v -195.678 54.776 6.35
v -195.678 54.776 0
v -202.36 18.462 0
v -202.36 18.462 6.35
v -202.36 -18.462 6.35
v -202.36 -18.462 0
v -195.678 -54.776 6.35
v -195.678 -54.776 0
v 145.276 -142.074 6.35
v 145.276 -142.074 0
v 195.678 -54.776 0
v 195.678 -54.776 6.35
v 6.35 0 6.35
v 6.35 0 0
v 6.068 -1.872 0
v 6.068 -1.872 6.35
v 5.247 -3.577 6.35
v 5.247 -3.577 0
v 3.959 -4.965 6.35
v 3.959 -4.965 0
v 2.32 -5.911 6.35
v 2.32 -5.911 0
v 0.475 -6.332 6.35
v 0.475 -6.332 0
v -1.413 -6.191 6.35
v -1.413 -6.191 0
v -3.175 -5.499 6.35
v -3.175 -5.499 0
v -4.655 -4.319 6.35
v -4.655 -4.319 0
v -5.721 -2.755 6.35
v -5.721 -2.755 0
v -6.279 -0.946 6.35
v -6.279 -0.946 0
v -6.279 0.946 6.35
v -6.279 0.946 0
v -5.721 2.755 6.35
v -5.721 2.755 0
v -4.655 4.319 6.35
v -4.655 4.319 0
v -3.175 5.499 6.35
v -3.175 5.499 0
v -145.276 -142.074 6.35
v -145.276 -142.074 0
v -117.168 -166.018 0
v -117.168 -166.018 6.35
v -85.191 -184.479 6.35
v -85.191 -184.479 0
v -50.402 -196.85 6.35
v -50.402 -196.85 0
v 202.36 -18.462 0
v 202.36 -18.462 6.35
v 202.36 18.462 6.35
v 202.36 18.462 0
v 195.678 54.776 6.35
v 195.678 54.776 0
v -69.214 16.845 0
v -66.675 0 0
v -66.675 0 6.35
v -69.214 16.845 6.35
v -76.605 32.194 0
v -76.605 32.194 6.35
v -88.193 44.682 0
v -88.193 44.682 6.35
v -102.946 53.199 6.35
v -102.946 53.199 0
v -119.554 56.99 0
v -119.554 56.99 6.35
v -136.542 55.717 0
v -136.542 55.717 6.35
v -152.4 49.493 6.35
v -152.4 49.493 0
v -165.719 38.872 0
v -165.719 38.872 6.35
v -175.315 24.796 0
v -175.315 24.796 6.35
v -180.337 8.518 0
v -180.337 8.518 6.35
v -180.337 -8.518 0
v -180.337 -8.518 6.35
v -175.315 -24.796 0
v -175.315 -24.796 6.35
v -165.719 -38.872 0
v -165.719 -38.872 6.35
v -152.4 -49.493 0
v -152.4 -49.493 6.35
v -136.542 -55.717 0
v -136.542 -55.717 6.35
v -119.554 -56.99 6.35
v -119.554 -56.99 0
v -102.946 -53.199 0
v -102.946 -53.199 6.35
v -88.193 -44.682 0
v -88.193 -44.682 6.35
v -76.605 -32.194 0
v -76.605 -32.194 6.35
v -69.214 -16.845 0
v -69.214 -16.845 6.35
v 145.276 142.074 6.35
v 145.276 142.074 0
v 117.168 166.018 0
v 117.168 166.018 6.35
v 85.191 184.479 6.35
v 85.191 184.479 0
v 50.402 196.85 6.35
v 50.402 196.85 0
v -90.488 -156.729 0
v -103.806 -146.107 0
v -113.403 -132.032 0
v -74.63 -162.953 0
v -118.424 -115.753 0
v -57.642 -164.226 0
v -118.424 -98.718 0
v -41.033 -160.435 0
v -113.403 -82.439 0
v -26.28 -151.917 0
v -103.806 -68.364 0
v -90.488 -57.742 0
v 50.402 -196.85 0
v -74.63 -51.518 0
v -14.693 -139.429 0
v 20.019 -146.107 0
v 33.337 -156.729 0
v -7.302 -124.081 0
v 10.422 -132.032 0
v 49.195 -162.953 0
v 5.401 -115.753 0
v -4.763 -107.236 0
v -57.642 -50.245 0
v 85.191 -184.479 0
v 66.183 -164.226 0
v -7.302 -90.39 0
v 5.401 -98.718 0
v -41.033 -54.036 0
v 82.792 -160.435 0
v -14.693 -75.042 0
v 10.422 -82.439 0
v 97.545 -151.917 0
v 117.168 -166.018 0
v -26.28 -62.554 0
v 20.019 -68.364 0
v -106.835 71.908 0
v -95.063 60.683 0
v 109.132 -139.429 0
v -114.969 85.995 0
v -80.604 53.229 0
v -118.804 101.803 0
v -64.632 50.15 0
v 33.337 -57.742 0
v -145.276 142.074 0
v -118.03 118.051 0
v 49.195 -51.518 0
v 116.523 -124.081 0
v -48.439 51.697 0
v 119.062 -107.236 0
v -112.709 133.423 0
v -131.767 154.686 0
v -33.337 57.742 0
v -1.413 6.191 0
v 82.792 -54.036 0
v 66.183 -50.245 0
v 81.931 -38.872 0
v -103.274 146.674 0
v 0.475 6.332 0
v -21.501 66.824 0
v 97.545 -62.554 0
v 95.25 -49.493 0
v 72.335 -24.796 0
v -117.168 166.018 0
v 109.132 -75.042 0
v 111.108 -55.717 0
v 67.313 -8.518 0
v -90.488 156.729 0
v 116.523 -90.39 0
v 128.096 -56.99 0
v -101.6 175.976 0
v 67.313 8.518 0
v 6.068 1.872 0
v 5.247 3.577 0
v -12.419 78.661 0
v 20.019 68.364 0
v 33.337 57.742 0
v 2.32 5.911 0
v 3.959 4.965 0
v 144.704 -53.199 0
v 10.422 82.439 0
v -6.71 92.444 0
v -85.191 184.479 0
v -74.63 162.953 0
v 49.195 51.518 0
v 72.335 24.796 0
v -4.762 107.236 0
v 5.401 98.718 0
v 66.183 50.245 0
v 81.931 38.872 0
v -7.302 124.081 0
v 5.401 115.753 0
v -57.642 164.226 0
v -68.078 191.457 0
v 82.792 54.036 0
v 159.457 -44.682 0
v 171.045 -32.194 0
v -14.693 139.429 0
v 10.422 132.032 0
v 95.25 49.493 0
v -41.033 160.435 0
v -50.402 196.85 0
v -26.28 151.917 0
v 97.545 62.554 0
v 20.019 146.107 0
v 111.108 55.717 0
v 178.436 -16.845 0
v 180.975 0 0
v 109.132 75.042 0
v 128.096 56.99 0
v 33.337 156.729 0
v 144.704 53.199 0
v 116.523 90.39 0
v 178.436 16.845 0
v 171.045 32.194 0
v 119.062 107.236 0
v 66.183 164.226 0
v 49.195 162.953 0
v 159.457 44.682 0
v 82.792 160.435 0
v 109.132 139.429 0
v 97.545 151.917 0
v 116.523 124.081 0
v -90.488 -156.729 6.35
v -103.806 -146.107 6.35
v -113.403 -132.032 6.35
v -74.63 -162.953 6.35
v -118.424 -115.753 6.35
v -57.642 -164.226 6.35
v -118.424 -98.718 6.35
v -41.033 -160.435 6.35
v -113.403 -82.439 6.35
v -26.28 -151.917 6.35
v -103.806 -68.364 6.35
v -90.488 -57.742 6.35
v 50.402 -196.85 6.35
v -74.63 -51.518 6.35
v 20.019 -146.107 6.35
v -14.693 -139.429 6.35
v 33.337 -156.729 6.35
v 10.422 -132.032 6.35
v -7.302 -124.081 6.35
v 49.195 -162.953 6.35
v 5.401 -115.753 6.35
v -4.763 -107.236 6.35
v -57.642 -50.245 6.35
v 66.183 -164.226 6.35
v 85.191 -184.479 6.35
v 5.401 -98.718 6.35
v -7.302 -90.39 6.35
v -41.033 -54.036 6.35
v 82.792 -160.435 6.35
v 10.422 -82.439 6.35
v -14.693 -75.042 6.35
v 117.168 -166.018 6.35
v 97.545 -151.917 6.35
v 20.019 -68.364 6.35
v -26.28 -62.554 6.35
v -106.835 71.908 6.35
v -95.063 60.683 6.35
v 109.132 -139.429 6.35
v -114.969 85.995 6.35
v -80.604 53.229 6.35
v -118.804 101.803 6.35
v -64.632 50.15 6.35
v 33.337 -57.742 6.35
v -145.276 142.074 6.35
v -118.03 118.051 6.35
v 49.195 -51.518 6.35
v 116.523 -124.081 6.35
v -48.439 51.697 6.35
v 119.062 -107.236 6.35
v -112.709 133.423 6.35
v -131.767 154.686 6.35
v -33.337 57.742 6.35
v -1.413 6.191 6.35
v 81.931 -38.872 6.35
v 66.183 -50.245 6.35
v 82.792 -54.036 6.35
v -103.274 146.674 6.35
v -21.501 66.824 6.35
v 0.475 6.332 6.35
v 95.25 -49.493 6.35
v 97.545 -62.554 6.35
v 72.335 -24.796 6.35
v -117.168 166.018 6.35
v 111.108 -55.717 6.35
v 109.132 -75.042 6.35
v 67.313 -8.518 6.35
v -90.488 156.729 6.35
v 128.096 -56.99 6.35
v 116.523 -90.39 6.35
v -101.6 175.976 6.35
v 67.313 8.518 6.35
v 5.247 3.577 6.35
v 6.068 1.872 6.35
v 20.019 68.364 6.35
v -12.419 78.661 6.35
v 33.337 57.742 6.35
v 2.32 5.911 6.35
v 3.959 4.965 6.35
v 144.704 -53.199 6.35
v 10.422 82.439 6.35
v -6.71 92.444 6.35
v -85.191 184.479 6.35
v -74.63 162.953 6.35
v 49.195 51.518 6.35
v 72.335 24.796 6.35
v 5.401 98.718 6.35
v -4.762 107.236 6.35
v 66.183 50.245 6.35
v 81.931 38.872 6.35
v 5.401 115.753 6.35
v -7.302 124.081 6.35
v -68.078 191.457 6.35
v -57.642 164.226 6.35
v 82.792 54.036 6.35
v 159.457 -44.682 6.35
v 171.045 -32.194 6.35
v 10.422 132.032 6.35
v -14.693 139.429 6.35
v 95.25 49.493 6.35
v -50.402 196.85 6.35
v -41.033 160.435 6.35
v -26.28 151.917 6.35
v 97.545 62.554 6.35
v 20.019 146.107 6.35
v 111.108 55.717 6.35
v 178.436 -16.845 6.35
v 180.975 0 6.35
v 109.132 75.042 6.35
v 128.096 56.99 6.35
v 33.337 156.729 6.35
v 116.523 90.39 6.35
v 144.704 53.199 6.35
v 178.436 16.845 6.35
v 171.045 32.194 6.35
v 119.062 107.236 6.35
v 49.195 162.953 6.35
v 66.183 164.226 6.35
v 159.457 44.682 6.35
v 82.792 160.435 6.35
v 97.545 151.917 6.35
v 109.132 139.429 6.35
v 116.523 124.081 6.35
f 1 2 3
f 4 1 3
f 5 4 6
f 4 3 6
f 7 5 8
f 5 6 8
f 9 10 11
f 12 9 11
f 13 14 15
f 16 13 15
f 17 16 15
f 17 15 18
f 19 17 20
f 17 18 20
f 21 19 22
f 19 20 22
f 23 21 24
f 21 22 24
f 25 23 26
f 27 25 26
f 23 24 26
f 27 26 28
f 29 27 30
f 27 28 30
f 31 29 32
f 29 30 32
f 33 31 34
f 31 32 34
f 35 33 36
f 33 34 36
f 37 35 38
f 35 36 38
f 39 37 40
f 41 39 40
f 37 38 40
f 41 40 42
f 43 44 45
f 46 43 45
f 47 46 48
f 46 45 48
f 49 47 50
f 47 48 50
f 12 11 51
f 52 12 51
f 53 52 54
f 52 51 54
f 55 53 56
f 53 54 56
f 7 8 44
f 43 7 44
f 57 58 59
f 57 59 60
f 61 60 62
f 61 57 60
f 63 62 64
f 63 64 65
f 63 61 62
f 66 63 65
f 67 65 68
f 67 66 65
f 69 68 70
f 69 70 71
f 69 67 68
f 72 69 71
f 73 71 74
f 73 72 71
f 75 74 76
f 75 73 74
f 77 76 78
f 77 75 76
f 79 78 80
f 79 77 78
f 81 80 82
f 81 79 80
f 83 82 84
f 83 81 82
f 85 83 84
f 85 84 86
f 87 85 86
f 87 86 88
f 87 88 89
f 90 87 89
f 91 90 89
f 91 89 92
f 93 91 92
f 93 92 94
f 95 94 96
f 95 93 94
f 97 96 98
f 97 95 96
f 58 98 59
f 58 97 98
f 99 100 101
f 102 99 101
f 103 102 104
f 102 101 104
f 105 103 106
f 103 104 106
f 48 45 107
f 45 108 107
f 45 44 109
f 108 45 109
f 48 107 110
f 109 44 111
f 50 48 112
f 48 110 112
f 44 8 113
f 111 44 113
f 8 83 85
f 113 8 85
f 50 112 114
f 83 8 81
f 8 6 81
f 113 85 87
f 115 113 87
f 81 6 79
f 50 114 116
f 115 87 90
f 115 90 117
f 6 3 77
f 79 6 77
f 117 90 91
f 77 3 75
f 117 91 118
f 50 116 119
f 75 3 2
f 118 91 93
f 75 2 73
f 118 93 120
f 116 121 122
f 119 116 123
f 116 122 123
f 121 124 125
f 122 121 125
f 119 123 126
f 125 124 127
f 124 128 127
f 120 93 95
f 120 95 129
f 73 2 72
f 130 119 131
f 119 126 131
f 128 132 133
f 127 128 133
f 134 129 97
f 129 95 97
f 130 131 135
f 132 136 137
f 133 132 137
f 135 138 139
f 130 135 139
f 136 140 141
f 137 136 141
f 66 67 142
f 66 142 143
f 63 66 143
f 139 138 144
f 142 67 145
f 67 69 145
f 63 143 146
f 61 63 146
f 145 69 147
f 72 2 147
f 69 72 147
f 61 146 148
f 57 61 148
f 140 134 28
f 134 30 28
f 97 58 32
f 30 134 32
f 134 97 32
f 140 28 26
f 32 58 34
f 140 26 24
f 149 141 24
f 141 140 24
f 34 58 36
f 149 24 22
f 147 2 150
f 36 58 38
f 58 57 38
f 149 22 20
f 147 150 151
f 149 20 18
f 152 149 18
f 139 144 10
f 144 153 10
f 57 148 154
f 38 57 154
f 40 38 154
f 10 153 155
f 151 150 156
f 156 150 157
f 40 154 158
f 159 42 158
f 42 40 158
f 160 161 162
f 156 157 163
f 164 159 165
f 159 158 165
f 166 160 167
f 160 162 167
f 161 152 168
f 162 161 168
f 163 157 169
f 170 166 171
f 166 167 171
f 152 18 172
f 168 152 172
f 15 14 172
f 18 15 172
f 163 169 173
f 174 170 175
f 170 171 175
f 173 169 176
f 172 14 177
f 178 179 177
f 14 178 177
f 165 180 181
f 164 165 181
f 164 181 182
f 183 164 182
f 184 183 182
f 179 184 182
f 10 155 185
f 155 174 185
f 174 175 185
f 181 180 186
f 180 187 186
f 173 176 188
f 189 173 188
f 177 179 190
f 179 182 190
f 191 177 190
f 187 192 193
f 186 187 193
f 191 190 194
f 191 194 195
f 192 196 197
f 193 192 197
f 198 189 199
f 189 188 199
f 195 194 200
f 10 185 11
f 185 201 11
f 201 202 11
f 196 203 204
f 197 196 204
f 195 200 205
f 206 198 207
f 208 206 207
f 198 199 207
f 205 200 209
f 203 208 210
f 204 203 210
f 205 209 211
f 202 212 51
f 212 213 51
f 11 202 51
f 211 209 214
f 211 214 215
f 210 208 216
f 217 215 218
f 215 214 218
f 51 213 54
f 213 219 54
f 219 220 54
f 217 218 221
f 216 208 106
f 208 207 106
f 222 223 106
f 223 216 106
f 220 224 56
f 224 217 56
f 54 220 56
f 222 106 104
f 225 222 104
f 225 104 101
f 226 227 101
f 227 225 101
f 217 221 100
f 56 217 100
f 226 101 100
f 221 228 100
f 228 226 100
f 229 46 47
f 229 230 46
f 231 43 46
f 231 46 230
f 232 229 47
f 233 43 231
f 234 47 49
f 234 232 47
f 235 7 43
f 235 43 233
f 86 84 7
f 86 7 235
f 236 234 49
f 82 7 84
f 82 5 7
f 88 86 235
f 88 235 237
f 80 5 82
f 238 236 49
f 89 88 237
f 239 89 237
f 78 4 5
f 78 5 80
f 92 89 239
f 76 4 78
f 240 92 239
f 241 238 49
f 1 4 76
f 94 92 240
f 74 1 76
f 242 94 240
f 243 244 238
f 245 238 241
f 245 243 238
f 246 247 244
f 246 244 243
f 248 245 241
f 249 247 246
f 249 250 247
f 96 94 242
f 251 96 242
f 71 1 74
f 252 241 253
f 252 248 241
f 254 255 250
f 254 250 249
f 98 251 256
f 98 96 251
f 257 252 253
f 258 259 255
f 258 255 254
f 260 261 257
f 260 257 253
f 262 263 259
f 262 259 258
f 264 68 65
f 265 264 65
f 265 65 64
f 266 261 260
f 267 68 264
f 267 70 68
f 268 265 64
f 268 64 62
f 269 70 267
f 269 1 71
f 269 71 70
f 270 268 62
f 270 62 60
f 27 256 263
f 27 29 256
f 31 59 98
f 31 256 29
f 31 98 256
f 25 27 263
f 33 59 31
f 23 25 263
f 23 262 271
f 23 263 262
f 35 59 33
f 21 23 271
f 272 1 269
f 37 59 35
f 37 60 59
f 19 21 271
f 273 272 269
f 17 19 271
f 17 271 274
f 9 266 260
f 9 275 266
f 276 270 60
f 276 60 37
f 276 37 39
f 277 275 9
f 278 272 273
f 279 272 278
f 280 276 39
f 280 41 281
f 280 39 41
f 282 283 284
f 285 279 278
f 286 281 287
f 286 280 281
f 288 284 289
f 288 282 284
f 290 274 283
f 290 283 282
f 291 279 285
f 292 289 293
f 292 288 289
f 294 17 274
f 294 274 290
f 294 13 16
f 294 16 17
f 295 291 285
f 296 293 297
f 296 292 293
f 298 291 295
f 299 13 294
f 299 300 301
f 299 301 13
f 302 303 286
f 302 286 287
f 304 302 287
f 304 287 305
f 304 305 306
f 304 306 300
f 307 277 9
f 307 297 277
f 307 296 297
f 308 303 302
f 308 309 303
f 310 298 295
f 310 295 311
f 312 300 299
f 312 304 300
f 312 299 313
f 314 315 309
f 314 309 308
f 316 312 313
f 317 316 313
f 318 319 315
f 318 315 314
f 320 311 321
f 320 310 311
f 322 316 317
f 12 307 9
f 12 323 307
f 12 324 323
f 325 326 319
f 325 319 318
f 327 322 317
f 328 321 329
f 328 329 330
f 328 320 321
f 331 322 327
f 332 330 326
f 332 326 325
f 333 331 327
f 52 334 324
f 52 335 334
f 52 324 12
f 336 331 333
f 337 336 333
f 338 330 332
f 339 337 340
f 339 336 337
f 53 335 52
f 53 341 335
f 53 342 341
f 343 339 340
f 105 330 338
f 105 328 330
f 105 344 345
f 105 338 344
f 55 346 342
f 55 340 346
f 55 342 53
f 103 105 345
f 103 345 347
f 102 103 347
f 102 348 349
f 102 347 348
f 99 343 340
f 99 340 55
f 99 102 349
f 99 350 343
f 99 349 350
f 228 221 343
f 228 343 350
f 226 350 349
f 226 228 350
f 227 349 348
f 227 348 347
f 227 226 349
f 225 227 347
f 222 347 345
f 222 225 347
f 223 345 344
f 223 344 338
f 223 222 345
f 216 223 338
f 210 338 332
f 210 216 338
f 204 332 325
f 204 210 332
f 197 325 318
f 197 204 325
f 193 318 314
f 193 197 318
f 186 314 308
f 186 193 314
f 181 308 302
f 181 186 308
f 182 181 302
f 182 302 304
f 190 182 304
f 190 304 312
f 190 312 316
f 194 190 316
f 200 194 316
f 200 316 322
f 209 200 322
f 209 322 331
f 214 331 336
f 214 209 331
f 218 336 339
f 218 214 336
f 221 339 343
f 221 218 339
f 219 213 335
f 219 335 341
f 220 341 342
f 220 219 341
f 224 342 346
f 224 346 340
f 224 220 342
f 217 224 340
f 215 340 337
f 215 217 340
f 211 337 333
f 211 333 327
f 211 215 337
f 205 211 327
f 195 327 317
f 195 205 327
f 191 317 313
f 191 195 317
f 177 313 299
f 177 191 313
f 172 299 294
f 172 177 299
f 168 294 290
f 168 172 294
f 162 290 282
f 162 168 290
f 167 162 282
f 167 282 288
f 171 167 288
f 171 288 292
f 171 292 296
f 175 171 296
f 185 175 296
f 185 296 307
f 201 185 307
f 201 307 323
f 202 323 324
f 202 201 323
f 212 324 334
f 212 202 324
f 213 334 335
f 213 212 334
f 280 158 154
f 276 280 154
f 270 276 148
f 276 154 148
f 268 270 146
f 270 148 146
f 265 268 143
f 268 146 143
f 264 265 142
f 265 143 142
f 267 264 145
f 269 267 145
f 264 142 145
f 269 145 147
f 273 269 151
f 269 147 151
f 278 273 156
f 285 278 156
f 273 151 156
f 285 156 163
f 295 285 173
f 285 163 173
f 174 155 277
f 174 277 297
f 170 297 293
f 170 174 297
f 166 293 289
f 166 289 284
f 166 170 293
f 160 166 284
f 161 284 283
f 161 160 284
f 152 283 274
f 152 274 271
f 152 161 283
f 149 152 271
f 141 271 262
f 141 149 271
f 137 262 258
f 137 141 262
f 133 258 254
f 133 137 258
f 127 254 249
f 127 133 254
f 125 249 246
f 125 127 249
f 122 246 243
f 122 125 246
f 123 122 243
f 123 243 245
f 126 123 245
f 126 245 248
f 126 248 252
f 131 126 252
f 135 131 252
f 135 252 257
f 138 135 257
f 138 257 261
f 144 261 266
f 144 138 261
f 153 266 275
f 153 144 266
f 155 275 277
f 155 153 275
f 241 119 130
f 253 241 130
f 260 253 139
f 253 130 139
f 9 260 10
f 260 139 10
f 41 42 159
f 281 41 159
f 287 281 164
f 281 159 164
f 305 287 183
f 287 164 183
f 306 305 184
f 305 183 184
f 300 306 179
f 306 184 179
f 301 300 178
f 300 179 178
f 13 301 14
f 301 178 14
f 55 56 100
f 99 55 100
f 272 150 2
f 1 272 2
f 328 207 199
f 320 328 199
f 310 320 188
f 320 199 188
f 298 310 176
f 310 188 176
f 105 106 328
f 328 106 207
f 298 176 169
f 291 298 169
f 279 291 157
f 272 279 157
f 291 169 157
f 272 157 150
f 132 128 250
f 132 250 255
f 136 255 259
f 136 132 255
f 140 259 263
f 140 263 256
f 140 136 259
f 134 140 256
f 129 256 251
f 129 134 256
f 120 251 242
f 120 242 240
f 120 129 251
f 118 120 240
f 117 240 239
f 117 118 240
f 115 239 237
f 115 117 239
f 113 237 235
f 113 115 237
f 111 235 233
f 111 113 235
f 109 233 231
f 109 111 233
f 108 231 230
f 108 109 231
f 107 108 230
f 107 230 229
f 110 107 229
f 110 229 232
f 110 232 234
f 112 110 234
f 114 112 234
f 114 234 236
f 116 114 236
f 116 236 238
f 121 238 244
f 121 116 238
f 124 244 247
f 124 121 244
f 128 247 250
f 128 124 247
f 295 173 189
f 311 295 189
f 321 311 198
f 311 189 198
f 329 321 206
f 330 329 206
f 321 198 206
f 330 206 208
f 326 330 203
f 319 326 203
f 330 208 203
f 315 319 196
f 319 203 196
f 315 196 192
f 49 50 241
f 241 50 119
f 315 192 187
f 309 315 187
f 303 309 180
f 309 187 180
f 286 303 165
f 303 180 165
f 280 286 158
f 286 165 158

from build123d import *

# Parameters (mm, degrees)
F0_R     = 57.15
F1_DEPTH = 6.35


with BuildPart() as f1:
    # F0 (on Top) → F1 (new body)
    with BuildSketch(Plane.XY):
        with BuildLine():
            Line((50.401562, 196.85), (-50.401562, 196.85))
            ThreePointArc((-50.401562, 196.85), (-76.714053, 188.16268), (-101.6, 175.976362))
            ThreePointArc((-101.6, 175.976362), (-124.596634, 160.517659), (-145.276319, 142.074033))
            Line((-145.276319, 142.074033), (-195.677882, 54.775967))
            ThreePointArc((-195.677882, 54.775967), (-203.2, 0), (-195.677882, -54.775967))
            Line((-195.677882, -54.775967), (-145.276319, -142.074033))
            ThreePointArc((-145.276319, -142.074033), (-101.6, -175.976362), (-50.401562, -196.85))
            Line((-50.401562, -196.85), (50.401562, -196.85))
            ThreePointArc((50.401562, -196.85), (101.6, -175.976362), (145.276319, -142.074033))
            Line((145.276319, -142.074033), (195.677882, -54.775967))
            ThreePointArc((195.677882, -54.775967), (203.2, 0), (195.677882, 54.775967))
            Line((195.677882, 54.775967), (145.276319, 142.074033))
            ThreePointArc((145.276319, 142.074033), (101.6, 175.976362), (50.401562, 196.85))
        make_face()
        with Locations((-61.9125, -107.235596)):
            Circle(F0_R, mode=Mode.SUBTRACT)
        with Locations((61.9125, -107.235596)):
            Circle(F0_R, mode=Mode.SUBTRACT)
        with Locations((-123.825, 0)):
            Circle(F0_R, mode=Mode.SUBTRACT)
        with BuildLine():
            ThreePointArc((6.35, 0), (-3.175, -5.499261), (-3.175, 5.499261))
            ThreePointArc((-3.175, 5.499261), (3.175, 5.499261), (6.35, 0))
        make_face(mode=Mode.SUBTRACT)
        with BuildLine():
            ThreePointArc((-33.3375, 57.742244), (-111.405852, 78.660596), (-90.4875, 156.728947))
            ThreePointArc((-90.4875, 156.728947), (-33.3375, 156.728947), (-4.7625, 107.235596))
            ThreePointArc((-4.7625, 107.235596), (-12.419148, 78.660596), (-33.3375, 57.742244))
        make_face(mode=Mode.SUBTRACT)
        with Locations((123.825, 0)):
            Circle(F0_R, mode=Mode.SUBTRACT)
        with Locations((61.9125, 107.235596)):
            Circle(F0_R, mode=Mode.SUBTRACT)
    extrude(amount=F1_DEPTH)


solid = f1.part
